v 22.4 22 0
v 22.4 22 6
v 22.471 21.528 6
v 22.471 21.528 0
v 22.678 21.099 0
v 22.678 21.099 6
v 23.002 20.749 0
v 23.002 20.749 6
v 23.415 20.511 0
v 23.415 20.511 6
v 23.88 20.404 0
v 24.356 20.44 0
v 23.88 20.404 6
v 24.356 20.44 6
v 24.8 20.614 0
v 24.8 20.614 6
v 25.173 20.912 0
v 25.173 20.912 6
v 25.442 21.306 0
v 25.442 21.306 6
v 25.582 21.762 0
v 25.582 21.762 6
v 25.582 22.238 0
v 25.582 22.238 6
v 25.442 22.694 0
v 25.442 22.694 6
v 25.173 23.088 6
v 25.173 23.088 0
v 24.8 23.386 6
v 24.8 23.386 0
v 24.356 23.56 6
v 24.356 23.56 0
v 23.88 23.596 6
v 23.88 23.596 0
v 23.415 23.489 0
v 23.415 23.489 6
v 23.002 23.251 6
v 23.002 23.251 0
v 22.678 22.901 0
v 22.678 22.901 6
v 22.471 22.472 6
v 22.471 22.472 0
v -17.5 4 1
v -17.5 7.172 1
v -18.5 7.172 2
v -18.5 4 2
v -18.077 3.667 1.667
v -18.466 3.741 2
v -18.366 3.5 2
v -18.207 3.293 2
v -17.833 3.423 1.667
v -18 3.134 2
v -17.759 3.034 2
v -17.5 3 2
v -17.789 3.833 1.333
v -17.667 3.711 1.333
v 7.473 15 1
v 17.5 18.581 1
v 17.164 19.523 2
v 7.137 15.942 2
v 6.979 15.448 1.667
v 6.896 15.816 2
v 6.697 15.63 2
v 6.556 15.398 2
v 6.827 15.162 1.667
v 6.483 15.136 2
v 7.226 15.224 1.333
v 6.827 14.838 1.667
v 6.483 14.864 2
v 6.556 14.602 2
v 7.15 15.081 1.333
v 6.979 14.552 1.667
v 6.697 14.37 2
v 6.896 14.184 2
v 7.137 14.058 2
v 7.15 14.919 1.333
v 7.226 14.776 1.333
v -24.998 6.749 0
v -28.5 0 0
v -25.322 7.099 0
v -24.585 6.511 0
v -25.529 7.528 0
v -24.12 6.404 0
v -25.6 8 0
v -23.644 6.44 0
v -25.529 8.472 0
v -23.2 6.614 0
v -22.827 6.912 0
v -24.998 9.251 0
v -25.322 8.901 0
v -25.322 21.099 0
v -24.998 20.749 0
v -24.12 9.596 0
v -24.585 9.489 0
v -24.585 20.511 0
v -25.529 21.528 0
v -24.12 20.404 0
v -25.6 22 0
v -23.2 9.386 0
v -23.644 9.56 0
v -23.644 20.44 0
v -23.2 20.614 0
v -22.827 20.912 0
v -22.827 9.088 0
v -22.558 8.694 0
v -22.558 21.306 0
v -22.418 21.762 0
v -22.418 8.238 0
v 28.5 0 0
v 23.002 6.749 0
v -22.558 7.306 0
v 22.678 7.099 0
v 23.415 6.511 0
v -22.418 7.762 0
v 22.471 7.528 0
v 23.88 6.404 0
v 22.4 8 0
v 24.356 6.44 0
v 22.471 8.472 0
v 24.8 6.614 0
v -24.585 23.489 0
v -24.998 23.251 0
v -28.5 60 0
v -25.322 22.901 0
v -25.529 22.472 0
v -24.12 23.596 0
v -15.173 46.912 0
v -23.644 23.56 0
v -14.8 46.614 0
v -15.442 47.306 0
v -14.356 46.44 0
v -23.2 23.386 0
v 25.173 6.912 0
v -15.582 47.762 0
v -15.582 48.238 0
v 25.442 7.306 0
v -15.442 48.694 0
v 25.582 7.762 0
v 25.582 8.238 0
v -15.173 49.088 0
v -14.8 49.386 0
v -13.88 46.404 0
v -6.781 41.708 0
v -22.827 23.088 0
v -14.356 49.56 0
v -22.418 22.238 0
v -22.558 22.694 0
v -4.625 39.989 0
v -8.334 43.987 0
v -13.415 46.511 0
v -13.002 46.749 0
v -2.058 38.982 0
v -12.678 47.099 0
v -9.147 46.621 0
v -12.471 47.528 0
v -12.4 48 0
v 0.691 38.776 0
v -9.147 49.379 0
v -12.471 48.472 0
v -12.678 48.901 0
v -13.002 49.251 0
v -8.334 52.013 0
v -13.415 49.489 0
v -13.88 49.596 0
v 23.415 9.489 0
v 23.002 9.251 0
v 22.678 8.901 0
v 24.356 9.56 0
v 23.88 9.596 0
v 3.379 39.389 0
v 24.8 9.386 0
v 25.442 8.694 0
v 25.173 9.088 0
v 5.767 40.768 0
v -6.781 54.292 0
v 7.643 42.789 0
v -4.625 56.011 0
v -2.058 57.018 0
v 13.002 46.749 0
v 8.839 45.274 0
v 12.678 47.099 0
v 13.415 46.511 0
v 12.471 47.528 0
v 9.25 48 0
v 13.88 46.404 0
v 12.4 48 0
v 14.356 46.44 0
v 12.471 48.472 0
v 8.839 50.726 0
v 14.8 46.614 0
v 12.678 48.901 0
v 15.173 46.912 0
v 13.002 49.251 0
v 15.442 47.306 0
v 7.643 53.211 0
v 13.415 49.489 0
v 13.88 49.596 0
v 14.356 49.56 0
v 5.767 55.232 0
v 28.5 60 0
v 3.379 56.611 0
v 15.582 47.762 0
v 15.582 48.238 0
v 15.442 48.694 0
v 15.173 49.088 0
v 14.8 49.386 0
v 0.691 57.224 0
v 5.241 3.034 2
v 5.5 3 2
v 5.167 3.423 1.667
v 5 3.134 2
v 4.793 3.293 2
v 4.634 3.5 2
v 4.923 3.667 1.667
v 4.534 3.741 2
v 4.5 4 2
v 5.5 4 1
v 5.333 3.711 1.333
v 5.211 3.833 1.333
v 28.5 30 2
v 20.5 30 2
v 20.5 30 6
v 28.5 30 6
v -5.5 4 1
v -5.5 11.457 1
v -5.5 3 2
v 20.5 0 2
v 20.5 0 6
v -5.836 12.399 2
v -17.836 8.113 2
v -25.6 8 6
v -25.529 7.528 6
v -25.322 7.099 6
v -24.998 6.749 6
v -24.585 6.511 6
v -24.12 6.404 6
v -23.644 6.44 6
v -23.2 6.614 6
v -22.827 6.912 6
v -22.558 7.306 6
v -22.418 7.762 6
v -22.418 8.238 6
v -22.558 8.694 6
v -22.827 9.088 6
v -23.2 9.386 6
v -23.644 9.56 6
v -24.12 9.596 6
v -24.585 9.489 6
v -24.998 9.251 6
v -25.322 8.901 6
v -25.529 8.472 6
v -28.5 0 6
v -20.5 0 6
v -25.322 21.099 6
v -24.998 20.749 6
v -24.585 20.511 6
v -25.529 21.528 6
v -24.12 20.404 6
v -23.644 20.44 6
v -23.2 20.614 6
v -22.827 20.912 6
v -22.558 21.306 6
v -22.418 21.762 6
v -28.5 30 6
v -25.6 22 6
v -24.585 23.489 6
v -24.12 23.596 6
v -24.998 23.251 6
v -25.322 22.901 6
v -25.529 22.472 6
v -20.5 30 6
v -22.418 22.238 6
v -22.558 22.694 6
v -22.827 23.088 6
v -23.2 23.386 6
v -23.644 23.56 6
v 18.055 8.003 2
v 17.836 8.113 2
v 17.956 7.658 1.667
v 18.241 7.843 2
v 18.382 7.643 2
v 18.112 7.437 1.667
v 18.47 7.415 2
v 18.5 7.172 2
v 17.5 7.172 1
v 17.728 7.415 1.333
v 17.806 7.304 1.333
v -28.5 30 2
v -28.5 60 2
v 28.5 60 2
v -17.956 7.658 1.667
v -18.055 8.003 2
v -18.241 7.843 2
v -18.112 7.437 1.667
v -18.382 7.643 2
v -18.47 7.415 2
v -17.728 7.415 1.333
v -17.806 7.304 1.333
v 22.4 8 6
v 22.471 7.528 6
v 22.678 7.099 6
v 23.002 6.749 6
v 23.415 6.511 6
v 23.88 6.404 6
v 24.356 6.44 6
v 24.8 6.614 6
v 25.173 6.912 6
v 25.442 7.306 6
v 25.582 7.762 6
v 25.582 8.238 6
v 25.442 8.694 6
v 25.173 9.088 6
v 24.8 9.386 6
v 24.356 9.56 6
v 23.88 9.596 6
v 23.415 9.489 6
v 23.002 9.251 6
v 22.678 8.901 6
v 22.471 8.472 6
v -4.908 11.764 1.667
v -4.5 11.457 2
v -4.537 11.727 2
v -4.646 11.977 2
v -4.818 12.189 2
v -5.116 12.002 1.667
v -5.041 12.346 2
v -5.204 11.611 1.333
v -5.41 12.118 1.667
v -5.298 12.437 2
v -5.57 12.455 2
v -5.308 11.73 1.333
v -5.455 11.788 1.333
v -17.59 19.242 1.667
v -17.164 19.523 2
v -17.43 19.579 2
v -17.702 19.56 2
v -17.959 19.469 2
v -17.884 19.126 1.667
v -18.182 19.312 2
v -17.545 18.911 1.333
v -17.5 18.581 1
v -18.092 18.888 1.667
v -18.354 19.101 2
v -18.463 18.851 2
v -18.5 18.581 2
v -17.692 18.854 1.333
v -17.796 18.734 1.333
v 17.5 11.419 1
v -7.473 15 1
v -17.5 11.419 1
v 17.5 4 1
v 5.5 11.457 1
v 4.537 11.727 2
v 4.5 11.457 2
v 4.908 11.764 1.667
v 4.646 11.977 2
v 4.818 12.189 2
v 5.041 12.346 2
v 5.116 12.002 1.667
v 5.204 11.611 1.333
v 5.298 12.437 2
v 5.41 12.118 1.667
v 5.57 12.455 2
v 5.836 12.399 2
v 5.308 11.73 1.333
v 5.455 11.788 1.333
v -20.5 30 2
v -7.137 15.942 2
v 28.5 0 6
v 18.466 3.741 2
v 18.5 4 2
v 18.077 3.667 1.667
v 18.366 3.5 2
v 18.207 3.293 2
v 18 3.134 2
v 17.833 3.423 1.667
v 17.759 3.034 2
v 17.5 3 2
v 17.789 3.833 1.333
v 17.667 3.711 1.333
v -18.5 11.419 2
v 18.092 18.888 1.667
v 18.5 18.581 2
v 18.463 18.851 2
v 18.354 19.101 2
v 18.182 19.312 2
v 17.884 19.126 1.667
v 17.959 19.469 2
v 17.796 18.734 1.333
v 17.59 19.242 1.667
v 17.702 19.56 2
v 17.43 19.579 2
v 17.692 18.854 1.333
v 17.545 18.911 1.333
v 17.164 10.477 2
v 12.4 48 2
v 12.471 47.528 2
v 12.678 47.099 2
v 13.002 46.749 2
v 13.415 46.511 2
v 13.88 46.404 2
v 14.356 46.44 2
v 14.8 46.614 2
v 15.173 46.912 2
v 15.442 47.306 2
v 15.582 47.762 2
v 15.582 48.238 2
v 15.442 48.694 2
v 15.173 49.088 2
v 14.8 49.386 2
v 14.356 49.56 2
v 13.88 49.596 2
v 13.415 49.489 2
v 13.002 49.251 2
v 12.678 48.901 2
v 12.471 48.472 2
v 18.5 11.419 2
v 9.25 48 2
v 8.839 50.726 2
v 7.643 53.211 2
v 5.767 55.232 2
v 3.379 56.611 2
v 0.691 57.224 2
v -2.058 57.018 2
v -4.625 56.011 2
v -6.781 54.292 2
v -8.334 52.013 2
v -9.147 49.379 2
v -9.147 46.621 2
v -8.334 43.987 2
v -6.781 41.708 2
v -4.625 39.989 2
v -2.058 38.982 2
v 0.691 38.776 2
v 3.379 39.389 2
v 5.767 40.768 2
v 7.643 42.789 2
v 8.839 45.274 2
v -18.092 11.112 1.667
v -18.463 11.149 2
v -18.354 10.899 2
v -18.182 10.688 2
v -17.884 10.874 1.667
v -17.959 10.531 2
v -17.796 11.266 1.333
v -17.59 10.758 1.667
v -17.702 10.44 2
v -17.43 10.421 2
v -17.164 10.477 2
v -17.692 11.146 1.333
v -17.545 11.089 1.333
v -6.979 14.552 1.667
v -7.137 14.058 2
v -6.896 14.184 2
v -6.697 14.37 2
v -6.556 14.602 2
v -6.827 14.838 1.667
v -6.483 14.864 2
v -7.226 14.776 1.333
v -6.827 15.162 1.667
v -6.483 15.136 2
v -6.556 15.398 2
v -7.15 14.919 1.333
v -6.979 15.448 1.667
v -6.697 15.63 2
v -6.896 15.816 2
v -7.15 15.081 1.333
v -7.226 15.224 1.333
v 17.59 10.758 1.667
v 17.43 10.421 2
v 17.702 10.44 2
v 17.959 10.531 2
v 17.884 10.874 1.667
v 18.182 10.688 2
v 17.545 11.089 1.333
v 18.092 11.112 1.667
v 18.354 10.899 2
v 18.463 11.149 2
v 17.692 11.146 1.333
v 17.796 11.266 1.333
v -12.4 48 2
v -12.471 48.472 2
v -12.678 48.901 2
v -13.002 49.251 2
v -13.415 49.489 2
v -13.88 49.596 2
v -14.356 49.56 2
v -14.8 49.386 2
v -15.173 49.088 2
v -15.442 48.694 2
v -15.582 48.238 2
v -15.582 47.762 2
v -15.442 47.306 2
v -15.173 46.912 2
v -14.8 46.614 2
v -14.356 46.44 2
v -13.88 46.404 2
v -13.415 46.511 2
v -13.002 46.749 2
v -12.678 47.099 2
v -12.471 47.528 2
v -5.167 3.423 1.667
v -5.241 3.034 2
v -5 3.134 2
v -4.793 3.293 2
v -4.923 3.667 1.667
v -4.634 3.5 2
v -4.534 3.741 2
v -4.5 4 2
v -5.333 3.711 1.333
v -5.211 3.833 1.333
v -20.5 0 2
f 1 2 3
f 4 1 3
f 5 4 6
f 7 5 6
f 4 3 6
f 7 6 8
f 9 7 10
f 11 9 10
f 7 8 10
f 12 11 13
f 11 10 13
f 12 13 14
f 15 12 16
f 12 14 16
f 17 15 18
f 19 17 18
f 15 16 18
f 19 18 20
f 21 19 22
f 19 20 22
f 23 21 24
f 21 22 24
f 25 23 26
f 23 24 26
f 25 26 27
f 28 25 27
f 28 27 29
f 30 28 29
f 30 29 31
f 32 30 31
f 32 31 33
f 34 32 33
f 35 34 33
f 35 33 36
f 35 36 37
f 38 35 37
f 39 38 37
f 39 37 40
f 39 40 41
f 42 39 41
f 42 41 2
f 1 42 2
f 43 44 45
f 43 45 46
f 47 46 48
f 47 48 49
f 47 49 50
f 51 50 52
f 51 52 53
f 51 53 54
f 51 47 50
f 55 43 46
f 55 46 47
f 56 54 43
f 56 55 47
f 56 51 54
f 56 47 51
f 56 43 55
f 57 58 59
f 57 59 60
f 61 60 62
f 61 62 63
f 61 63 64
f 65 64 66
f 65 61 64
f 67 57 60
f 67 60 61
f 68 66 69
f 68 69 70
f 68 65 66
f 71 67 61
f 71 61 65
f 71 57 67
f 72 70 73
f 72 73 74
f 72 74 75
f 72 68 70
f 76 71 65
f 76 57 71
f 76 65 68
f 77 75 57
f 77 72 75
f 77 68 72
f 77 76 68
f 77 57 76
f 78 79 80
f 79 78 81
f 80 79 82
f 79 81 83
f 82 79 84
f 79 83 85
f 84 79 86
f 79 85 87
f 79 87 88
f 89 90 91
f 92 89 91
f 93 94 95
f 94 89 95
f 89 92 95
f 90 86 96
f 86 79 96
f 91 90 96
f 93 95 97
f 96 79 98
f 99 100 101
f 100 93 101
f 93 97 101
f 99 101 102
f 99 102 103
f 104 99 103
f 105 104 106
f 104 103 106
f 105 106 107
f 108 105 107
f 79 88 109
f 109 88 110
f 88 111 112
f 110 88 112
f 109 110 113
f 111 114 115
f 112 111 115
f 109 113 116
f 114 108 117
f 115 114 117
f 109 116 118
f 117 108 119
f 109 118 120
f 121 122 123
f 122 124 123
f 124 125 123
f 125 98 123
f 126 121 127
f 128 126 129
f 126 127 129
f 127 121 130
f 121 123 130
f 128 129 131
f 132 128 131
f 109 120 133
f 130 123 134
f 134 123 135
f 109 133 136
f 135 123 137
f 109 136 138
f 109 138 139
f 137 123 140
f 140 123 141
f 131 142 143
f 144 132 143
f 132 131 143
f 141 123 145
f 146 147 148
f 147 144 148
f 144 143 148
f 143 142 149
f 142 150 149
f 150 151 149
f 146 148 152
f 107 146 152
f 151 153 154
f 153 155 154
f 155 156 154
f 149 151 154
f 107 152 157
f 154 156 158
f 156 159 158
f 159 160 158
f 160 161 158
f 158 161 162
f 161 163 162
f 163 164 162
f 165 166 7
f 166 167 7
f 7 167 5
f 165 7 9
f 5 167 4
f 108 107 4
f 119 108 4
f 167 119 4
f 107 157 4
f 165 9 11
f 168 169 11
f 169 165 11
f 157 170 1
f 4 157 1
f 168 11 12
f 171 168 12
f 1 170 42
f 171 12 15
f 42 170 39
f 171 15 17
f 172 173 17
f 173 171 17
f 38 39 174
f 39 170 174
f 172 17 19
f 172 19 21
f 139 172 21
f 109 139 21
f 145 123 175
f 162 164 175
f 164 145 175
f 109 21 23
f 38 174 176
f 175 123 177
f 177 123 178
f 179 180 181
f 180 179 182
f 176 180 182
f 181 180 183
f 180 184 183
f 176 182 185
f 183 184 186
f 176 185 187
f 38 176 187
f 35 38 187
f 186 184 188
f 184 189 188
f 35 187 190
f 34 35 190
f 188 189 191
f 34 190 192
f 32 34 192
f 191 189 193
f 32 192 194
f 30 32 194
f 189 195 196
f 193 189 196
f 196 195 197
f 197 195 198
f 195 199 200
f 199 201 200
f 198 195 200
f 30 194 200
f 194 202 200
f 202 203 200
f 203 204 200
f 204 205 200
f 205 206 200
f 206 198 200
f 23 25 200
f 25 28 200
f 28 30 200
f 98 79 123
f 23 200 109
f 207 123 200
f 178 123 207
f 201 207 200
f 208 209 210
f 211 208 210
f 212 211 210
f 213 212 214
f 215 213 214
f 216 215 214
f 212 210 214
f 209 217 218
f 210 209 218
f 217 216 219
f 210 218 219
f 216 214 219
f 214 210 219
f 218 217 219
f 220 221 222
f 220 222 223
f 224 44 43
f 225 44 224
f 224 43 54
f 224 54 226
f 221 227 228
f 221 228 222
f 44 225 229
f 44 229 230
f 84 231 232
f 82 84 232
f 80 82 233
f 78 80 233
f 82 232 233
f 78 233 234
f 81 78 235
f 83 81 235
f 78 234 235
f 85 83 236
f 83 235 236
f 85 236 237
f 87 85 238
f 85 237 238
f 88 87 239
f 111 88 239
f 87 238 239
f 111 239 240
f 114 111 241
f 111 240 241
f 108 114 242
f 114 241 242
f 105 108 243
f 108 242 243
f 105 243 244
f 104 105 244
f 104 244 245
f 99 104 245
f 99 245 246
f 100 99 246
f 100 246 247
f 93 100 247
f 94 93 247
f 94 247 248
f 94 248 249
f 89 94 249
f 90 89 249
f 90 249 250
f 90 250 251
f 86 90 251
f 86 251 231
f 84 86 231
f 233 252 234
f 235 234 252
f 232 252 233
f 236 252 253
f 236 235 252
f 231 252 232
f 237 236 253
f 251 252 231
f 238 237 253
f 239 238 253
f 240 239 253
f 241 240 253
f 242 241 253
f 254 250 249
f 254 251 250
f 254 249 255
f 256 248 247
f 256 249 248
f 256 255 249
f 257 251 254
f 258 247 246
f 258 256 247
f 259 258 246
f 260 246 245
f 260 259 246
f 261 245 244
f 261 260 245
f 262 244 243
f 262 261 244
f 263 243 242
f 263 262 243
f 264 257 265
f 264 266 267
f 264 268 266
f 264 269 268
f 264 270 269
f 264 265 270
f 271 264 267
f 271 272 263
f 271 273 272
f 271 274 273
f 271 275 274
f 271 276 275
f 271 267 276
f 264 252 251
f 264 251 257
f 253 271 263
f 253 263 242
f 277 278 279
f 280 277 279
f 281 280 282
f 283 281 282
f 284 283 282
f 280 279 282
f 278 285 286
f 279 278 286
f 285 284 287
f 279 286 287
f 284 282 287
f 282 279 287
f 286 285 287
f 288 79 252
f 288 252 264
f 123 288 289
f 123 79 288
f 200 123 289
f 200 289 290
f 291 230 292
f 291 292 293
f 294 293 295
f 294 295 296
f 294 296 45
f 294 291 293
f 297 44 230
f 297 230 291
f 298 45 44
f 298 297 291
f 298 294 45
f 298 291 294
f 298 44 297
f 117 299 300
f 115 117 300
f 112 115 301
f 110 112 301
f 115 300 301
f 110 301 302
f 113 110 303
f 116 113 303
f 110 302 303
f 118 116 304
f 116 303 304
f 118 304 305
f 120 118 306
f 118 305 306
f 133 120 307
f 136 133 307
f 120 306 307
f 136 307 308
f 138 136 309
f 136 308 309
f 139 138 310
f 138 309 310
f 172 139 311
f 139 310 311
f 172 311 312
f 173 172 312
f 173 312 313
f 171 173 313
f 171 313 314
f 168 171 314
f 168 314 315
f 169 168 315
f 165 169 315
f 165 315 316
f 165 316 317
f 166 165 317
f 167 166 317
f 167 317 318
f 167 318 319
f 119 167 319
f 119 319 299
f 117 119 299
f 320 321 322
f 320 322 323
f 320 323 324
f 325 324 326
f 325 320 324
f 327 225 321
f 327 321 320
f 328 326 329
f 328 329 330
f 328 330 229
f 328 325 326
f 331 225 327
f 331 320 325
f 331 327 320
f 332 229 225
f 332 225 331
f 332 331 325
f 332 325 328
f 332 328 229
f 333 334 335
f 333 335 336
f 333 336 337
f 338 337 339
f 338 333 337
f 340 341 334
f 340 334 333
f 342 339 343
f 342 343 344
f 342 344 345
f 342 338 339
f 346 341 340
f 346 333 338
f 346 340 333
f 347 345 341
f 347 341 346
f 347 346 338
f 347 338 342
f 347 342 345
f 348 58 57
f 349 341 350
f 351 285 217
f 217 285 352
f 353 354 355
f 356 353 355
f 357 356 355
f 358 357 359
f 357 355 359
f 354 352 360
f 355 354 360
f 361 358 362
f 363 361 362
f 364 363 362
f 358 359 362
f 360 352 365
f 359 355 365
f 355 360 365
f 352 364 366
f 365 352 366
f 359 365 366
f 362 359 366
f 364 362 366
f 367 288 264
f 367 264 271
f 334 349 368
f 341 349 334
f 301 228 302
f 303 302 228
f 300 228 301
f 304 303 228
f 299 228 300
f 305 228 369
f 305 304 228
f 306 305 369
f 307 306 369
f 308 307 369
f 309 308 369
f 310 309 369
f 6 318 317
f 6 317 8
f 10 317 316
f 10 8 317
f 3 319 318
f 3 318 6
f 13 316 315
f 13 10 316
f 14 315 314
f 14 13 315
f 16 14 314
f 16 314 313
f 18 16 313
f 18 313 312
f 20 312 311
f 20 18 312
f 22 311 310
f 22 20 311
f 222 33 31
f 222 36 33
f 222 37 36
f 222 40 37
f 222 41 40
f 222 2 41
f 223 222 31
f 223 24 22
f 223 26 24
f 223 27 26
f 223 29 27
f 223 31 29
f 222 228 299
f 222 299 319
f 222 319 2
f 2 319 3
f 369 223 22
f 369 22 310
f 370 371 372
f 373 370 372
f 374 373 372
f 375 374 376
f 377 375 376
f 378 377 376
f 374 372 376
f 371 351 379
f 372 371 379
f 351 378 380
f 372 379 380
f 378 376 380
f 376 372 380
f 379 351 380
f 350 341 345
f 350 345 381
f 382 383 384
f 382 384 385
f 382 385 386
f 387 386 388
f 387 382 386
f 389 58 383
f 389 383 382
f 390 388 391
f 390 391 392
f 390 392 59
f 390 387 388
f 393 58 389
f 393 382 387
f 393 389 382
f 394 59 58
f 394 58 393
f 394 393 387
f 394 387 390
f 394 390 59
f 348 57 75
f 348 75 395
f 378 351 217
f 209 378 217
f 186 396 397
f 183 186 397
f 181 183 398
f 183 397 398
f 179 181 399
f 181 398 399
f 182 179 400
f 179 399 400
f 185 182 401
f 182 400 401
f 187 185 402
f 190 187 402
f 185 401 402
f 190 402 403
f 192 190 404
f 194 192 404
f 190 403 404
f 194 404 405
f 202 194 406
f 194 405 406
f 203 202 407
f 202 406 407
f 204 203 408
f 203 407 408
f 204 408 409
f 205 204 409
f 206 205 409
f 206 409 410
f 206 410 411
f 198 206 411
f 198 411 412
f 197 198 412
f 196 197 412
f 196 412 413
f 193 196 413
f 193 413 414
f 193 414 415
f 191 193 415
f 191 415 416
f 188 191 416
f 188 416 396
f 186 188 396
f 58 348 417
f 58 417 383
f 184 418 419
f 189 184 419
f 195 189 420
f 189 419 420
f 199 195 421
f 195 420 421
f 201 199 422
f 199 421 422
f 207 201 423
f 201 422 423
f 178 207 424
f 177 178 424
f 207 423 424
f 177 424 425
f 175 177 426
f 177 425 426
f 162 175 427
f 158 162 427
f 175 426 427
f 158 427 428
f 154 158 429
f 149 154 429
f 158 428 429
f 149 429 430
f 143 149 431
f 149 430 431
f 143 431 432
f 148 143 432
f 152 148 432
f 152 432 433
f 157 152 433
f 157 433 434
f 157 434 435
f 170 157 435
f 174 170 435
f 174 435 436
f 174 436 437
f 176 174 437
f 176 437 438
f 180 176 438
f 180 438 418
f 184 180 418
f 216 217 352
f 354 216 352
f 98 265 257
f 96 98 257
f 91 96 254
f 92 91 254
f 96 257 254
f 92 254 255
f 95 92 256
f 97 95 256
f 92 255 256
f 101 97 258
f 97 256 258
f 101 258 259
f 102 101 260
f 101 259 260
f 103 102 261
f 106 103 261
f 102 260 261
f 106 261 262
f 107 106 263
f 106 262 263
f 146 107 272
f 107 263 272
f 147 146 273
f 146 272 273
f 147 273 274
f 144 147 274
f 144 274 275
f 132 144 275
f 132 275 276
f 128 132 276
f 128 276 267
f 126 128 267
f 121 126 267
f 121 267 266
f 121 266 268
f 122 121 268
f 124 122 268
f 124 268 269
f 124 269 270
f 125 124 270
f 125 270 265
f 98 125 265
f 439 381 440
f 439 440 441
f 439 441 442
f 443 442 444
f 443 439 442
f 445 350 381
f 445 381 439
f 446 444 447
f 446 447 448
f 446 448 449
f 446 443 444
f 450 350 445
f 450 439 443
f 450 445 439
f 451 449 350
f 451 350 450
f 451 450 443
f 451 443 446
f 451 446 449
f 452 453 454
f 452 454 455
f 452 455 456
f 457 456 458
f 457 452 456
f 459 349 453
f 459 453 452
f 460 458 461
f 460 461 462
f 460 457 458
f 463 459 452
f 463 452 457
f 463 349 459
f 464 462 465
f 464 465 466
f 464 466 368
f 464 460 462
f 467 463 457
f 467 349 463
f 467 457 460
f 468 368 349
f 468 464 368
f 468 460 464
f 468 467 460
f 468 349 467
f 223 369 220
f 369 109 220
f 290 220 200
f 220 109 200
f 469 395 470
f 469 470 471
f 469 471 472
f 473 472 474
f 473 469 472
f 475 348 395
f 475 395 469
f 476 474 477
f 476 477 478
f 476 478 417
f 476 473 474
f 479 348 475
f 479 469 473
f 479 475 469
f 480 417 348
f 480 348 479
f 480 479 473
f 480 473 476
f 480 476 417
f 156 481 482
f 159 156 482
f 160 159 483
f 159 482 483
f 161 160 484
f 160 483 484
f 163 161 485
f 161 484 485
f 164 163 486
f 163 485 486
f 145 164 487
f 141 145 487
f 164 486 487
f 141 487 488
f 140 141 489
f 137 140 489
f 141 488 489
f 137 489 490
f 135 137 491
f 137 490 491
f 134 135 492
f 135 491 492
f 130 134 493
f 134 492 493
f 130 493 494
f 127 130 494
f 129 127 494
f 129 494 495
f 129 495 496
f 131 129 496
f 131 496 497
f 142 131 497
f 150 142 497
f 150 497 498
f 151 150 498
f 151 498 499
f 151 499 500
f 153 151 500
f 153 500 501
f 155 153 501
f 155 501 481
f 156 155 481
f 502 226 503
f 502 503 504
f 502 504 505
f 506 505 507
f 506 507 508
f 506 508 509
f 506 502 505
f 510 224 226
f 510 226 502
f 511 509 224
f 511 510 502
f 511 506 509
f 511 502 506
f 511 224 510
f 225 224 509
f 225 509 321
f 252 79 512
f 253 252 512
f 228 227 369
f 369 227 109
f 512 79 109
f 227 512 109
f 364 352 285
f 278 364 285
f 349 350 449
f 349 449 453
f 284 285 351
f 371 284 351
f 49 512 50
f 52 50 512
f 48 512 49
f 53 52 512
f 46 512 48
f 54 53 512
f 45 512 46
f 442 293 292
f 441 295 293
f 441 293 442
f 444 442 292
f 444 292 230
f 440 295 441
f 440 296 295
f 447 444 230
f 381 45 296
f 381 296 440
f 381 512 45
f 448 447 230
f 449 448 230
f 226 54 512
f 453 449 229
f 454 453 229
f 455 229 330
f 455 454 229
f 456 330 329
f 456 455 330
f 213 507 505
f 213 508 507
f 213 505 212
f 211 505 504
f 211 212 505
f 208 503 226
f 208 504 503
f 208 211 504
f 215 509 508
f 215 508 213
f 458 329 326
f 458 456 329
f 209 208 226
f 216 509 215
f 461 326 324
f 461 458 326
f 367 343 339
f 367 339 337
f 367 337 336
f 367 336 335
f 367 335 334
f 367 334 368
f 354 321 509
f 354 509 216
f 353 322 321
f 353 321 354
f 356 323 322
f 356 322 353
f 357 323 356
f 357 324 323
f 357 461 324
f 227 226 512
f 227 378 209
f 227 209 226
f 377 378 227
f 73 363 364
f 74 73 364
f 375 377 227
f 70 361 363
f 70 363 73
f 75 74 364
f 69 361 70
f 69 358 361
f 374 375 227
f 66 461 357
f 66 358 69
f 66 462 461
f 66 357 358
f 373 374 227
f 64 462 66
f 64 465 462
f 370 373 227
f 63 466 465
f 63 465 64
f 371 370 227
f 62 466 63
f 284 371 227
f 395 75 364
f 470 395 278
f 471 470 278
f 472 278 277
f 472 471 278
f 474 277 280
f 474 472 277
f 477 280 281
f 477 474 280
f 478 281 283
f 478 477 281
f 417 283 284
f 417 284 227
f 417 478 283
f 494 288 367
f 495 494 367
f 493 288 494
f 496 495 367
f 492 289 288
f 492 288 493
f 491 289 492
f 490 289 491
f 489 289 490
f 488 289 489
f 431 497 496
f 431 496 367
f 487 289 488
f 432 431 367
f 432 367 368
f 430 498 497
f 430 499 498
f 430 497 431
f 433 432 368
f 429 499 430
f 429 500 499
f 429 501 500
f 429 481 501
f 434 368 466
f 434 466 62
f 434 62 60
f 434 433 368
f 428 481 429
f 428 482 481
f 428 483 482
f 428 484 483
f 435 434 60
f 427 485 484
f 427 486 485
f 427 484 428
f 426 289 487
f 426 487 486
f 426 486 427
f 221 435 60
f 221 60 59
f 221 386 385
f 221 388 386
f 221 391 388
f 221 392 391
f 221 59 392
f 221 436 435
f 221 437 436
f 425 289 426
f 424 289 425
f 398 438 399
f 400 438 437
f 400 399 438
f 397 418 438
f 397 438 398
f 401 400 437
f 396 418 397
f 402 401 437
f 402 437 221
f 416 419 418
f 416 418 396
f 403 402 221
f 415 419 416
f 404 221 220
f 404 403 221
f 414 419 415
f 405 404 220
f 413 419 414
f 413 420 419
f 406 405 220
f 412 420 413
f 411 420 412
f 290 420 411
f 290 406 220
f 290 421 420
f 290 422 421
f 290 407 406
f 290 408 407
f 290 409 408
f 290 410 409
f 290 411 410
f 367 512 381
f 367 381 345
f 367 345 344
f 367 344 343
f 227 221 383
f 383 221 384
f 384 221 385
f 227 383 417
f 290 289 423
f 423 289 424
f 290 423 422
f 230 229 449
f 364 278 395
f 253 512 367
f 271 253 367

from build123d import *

# Parameters (mm, degrees)
SKIZZE1_W                       = 57
SKIZZE1_H                       = 60
GRUNDPLATTE_DEPTH               = 2
SKIZZE2_R                       = 9.25
SKIZZE2_R_2                     = 1.6
AUSSCHNITT_ROLLE_DEPTH          = 67.454871906
SKIZZE4_W                       = 8
SKIZZE4_H                       = 30
AUFSATZ_GETRIEBE_DEPTH          = 4
BOHRUNGEN_START                 = 4
SKIZZE3_R                       = 1.6
BOHRUNGEN_GETRIEBE_DEPTH        = 71.54509749
SCHNITT_LINEAR_AUSTRAGEN3_DEPTH = 1
VERRUNDUNG1_R                   = 1
FASE1_SIZE                      = 1


with BuildPart() as part:
    # Skizze1 → Grundplatte (new body)
    with BuildSketch(Plane.XY):
        with Locations((0, 30)):
            Rectangle(SKIZZE1_W, SKIZZE1_H)
    extrude(amount=GRUNDPLATTE_DEPTH)

    # Skizze2 → Ausschnitt_Rolle (cut, through all)
    with BuildSketch(Plane.XY.offset(2)):
        with Locations((0, 48)):
            Circle(SKIZZE2_R)
        with Locations((-14, 48)):
            Circle(SKIZZE2_R_2)
        with Locations(Location((14, 48, 0), (0, 0, 180))):
            Circle(SKIZZE2_R_2)
    extrude(amount=-AUSSCHNITT_ROLLE_DEPTH, mode=Mode.SUBTRACT)

    # Skizze4 → Aufsatz Getriebe (add)
    with BuildSketch(Plane.XY.offset(2)):
        with Locations((24.5, 15)):
            Rectangle(SKIZZE4_W, SKIZZE4_H)
        with Locations((-24.5, 15)):
            Rectangle(SKIZZE4_W, SKIZZE4_H)
    extrude(amount=AUFSATZ_GETRIEBE_DEPTH)

    # Skizze3 → Bohrungen Getriebe (cut, through all)
    with BuildSketch(Plane.XY.offset(2).offset(BOHRUNGEN_START)):
        with Locations(Location((-24, 22, 0), (0, 0, 180))):
            Circle(SKIZZE3_R)
        with Locations(Location((-24, 8, 0), (0, 0, 180))):
            Circle(SKIZZE3_R)
        with Locations(Location((24, 8, 0), (0, 0, 180))):
            Circle(SKIZZE3_R)
        with Locations(Location((24, 22, 0), (0, 0, 180))):
            Circle(SKIZZE3_R)
    extrude(amount=-BOHRUNGEN_GETRIEBE_DEPTH, mode=Mode.SUBTRACT)

    # Skizze5 → Schnitt-Linear austragen3 (cut)
    with BuildSketch(Plane.XY.offset(2)):
        Polygon((-18.5, 20), (-18.5, 10), (-4.5, 15), align=None)
        Polygon((-18.5, 7.876275893), (-18.5, 3), (-4.5, 3), (-4.5, 12.876275893), align=None)
        Polygon((4.5, 12.876275893), (18.5, 7.876275893), (18.5, 3), (4.5, 3), align=None)
        Polygon((4.5, 15), (18.5, 20), (18.5, 10), align=None)
    extrude(amount=-SCHNITT_LINEAR_AUSTRAGEN3_DEPTH, mode=Mode.SUBTRACT)

    # Verrundung1
    verrundung1_edges = [part.edges().sort_by_distance(p)[0] for p in [
        (-18.5, 3, 1.5),
        (-4.5, 3, 1.5),
        (-4.5, 12.876275893, 1.5),
        (-18.5, 7.876275893, 1.5),
        (18.5, 20, 1.5),
        (4.5, 15, 1.5),
        (18.5, 10, 1.5),
        (18.5, 3, 1.5),
        (18.5, 7.876275893, 1.5),
        (4.5, 12.876275893, 1.5),
        (4.5, 3, 1.5),
        (-18.5, 10, 1.5),
        (-4.5, 15, 1.5),
        (-18.5, 20, 1.5),
    ]]
    fillet(verrundung1_edges, radius=VERRUNDUNG1_R)

    # Fase1
    fase1_edges = [part.edges().sort_by_distance(p)[0] for p in [
        (4.923951563, 12.274686543, 1),
        (11.836336397, 10.256155751, 1),
        (18.31741556, 7.747605134, 1),
        (18.5, 5.585778349, 1),
        (18.207106781, 3.292893219, 1),
        (11.5, 3, 1),
        (4.792893219, 3.292893219, 1),
        (4.5, 7.728635491, 1),
        (18.076048437, 10.60158935, 1),
        (12.150270478, 12.267760544, 1),
        (6.473213749, 15, 1),
        (12.150270478, 17.732239456, 1),
        (18.076048437, 19.39841065, 1),
        (18.5, 15, 1),
        (-18.207106781, 3.292893219, 1),
        (-18.5, 5.585778349, 1),
        (-18.31741556, 7.747605134, 1),
        (-11.836336397, 10.256155751, 1),
        (-4.923951563, 12.274686543, 1),
        (-4.5, 7.728635491, 1),
        (-4.792893219, 3.292893219, 1),
        (-11.5, 3, 1),
        (-18.076048437, 10.60158935, 1),
        (-18.5, 15, 1),
        (-18.076048437, 19.39841065, 1),
        (-12.150270478, 17.732239456, 1),
        (-6.473213749, 15, 1),
        (-12.150270478, 12.267760544, 1),
    ]]
    chamfer(fase1_edges, length=FASE1_SIZE - 0.0001)  # a hair under: the kernel refuses the full size


solid = part.part
